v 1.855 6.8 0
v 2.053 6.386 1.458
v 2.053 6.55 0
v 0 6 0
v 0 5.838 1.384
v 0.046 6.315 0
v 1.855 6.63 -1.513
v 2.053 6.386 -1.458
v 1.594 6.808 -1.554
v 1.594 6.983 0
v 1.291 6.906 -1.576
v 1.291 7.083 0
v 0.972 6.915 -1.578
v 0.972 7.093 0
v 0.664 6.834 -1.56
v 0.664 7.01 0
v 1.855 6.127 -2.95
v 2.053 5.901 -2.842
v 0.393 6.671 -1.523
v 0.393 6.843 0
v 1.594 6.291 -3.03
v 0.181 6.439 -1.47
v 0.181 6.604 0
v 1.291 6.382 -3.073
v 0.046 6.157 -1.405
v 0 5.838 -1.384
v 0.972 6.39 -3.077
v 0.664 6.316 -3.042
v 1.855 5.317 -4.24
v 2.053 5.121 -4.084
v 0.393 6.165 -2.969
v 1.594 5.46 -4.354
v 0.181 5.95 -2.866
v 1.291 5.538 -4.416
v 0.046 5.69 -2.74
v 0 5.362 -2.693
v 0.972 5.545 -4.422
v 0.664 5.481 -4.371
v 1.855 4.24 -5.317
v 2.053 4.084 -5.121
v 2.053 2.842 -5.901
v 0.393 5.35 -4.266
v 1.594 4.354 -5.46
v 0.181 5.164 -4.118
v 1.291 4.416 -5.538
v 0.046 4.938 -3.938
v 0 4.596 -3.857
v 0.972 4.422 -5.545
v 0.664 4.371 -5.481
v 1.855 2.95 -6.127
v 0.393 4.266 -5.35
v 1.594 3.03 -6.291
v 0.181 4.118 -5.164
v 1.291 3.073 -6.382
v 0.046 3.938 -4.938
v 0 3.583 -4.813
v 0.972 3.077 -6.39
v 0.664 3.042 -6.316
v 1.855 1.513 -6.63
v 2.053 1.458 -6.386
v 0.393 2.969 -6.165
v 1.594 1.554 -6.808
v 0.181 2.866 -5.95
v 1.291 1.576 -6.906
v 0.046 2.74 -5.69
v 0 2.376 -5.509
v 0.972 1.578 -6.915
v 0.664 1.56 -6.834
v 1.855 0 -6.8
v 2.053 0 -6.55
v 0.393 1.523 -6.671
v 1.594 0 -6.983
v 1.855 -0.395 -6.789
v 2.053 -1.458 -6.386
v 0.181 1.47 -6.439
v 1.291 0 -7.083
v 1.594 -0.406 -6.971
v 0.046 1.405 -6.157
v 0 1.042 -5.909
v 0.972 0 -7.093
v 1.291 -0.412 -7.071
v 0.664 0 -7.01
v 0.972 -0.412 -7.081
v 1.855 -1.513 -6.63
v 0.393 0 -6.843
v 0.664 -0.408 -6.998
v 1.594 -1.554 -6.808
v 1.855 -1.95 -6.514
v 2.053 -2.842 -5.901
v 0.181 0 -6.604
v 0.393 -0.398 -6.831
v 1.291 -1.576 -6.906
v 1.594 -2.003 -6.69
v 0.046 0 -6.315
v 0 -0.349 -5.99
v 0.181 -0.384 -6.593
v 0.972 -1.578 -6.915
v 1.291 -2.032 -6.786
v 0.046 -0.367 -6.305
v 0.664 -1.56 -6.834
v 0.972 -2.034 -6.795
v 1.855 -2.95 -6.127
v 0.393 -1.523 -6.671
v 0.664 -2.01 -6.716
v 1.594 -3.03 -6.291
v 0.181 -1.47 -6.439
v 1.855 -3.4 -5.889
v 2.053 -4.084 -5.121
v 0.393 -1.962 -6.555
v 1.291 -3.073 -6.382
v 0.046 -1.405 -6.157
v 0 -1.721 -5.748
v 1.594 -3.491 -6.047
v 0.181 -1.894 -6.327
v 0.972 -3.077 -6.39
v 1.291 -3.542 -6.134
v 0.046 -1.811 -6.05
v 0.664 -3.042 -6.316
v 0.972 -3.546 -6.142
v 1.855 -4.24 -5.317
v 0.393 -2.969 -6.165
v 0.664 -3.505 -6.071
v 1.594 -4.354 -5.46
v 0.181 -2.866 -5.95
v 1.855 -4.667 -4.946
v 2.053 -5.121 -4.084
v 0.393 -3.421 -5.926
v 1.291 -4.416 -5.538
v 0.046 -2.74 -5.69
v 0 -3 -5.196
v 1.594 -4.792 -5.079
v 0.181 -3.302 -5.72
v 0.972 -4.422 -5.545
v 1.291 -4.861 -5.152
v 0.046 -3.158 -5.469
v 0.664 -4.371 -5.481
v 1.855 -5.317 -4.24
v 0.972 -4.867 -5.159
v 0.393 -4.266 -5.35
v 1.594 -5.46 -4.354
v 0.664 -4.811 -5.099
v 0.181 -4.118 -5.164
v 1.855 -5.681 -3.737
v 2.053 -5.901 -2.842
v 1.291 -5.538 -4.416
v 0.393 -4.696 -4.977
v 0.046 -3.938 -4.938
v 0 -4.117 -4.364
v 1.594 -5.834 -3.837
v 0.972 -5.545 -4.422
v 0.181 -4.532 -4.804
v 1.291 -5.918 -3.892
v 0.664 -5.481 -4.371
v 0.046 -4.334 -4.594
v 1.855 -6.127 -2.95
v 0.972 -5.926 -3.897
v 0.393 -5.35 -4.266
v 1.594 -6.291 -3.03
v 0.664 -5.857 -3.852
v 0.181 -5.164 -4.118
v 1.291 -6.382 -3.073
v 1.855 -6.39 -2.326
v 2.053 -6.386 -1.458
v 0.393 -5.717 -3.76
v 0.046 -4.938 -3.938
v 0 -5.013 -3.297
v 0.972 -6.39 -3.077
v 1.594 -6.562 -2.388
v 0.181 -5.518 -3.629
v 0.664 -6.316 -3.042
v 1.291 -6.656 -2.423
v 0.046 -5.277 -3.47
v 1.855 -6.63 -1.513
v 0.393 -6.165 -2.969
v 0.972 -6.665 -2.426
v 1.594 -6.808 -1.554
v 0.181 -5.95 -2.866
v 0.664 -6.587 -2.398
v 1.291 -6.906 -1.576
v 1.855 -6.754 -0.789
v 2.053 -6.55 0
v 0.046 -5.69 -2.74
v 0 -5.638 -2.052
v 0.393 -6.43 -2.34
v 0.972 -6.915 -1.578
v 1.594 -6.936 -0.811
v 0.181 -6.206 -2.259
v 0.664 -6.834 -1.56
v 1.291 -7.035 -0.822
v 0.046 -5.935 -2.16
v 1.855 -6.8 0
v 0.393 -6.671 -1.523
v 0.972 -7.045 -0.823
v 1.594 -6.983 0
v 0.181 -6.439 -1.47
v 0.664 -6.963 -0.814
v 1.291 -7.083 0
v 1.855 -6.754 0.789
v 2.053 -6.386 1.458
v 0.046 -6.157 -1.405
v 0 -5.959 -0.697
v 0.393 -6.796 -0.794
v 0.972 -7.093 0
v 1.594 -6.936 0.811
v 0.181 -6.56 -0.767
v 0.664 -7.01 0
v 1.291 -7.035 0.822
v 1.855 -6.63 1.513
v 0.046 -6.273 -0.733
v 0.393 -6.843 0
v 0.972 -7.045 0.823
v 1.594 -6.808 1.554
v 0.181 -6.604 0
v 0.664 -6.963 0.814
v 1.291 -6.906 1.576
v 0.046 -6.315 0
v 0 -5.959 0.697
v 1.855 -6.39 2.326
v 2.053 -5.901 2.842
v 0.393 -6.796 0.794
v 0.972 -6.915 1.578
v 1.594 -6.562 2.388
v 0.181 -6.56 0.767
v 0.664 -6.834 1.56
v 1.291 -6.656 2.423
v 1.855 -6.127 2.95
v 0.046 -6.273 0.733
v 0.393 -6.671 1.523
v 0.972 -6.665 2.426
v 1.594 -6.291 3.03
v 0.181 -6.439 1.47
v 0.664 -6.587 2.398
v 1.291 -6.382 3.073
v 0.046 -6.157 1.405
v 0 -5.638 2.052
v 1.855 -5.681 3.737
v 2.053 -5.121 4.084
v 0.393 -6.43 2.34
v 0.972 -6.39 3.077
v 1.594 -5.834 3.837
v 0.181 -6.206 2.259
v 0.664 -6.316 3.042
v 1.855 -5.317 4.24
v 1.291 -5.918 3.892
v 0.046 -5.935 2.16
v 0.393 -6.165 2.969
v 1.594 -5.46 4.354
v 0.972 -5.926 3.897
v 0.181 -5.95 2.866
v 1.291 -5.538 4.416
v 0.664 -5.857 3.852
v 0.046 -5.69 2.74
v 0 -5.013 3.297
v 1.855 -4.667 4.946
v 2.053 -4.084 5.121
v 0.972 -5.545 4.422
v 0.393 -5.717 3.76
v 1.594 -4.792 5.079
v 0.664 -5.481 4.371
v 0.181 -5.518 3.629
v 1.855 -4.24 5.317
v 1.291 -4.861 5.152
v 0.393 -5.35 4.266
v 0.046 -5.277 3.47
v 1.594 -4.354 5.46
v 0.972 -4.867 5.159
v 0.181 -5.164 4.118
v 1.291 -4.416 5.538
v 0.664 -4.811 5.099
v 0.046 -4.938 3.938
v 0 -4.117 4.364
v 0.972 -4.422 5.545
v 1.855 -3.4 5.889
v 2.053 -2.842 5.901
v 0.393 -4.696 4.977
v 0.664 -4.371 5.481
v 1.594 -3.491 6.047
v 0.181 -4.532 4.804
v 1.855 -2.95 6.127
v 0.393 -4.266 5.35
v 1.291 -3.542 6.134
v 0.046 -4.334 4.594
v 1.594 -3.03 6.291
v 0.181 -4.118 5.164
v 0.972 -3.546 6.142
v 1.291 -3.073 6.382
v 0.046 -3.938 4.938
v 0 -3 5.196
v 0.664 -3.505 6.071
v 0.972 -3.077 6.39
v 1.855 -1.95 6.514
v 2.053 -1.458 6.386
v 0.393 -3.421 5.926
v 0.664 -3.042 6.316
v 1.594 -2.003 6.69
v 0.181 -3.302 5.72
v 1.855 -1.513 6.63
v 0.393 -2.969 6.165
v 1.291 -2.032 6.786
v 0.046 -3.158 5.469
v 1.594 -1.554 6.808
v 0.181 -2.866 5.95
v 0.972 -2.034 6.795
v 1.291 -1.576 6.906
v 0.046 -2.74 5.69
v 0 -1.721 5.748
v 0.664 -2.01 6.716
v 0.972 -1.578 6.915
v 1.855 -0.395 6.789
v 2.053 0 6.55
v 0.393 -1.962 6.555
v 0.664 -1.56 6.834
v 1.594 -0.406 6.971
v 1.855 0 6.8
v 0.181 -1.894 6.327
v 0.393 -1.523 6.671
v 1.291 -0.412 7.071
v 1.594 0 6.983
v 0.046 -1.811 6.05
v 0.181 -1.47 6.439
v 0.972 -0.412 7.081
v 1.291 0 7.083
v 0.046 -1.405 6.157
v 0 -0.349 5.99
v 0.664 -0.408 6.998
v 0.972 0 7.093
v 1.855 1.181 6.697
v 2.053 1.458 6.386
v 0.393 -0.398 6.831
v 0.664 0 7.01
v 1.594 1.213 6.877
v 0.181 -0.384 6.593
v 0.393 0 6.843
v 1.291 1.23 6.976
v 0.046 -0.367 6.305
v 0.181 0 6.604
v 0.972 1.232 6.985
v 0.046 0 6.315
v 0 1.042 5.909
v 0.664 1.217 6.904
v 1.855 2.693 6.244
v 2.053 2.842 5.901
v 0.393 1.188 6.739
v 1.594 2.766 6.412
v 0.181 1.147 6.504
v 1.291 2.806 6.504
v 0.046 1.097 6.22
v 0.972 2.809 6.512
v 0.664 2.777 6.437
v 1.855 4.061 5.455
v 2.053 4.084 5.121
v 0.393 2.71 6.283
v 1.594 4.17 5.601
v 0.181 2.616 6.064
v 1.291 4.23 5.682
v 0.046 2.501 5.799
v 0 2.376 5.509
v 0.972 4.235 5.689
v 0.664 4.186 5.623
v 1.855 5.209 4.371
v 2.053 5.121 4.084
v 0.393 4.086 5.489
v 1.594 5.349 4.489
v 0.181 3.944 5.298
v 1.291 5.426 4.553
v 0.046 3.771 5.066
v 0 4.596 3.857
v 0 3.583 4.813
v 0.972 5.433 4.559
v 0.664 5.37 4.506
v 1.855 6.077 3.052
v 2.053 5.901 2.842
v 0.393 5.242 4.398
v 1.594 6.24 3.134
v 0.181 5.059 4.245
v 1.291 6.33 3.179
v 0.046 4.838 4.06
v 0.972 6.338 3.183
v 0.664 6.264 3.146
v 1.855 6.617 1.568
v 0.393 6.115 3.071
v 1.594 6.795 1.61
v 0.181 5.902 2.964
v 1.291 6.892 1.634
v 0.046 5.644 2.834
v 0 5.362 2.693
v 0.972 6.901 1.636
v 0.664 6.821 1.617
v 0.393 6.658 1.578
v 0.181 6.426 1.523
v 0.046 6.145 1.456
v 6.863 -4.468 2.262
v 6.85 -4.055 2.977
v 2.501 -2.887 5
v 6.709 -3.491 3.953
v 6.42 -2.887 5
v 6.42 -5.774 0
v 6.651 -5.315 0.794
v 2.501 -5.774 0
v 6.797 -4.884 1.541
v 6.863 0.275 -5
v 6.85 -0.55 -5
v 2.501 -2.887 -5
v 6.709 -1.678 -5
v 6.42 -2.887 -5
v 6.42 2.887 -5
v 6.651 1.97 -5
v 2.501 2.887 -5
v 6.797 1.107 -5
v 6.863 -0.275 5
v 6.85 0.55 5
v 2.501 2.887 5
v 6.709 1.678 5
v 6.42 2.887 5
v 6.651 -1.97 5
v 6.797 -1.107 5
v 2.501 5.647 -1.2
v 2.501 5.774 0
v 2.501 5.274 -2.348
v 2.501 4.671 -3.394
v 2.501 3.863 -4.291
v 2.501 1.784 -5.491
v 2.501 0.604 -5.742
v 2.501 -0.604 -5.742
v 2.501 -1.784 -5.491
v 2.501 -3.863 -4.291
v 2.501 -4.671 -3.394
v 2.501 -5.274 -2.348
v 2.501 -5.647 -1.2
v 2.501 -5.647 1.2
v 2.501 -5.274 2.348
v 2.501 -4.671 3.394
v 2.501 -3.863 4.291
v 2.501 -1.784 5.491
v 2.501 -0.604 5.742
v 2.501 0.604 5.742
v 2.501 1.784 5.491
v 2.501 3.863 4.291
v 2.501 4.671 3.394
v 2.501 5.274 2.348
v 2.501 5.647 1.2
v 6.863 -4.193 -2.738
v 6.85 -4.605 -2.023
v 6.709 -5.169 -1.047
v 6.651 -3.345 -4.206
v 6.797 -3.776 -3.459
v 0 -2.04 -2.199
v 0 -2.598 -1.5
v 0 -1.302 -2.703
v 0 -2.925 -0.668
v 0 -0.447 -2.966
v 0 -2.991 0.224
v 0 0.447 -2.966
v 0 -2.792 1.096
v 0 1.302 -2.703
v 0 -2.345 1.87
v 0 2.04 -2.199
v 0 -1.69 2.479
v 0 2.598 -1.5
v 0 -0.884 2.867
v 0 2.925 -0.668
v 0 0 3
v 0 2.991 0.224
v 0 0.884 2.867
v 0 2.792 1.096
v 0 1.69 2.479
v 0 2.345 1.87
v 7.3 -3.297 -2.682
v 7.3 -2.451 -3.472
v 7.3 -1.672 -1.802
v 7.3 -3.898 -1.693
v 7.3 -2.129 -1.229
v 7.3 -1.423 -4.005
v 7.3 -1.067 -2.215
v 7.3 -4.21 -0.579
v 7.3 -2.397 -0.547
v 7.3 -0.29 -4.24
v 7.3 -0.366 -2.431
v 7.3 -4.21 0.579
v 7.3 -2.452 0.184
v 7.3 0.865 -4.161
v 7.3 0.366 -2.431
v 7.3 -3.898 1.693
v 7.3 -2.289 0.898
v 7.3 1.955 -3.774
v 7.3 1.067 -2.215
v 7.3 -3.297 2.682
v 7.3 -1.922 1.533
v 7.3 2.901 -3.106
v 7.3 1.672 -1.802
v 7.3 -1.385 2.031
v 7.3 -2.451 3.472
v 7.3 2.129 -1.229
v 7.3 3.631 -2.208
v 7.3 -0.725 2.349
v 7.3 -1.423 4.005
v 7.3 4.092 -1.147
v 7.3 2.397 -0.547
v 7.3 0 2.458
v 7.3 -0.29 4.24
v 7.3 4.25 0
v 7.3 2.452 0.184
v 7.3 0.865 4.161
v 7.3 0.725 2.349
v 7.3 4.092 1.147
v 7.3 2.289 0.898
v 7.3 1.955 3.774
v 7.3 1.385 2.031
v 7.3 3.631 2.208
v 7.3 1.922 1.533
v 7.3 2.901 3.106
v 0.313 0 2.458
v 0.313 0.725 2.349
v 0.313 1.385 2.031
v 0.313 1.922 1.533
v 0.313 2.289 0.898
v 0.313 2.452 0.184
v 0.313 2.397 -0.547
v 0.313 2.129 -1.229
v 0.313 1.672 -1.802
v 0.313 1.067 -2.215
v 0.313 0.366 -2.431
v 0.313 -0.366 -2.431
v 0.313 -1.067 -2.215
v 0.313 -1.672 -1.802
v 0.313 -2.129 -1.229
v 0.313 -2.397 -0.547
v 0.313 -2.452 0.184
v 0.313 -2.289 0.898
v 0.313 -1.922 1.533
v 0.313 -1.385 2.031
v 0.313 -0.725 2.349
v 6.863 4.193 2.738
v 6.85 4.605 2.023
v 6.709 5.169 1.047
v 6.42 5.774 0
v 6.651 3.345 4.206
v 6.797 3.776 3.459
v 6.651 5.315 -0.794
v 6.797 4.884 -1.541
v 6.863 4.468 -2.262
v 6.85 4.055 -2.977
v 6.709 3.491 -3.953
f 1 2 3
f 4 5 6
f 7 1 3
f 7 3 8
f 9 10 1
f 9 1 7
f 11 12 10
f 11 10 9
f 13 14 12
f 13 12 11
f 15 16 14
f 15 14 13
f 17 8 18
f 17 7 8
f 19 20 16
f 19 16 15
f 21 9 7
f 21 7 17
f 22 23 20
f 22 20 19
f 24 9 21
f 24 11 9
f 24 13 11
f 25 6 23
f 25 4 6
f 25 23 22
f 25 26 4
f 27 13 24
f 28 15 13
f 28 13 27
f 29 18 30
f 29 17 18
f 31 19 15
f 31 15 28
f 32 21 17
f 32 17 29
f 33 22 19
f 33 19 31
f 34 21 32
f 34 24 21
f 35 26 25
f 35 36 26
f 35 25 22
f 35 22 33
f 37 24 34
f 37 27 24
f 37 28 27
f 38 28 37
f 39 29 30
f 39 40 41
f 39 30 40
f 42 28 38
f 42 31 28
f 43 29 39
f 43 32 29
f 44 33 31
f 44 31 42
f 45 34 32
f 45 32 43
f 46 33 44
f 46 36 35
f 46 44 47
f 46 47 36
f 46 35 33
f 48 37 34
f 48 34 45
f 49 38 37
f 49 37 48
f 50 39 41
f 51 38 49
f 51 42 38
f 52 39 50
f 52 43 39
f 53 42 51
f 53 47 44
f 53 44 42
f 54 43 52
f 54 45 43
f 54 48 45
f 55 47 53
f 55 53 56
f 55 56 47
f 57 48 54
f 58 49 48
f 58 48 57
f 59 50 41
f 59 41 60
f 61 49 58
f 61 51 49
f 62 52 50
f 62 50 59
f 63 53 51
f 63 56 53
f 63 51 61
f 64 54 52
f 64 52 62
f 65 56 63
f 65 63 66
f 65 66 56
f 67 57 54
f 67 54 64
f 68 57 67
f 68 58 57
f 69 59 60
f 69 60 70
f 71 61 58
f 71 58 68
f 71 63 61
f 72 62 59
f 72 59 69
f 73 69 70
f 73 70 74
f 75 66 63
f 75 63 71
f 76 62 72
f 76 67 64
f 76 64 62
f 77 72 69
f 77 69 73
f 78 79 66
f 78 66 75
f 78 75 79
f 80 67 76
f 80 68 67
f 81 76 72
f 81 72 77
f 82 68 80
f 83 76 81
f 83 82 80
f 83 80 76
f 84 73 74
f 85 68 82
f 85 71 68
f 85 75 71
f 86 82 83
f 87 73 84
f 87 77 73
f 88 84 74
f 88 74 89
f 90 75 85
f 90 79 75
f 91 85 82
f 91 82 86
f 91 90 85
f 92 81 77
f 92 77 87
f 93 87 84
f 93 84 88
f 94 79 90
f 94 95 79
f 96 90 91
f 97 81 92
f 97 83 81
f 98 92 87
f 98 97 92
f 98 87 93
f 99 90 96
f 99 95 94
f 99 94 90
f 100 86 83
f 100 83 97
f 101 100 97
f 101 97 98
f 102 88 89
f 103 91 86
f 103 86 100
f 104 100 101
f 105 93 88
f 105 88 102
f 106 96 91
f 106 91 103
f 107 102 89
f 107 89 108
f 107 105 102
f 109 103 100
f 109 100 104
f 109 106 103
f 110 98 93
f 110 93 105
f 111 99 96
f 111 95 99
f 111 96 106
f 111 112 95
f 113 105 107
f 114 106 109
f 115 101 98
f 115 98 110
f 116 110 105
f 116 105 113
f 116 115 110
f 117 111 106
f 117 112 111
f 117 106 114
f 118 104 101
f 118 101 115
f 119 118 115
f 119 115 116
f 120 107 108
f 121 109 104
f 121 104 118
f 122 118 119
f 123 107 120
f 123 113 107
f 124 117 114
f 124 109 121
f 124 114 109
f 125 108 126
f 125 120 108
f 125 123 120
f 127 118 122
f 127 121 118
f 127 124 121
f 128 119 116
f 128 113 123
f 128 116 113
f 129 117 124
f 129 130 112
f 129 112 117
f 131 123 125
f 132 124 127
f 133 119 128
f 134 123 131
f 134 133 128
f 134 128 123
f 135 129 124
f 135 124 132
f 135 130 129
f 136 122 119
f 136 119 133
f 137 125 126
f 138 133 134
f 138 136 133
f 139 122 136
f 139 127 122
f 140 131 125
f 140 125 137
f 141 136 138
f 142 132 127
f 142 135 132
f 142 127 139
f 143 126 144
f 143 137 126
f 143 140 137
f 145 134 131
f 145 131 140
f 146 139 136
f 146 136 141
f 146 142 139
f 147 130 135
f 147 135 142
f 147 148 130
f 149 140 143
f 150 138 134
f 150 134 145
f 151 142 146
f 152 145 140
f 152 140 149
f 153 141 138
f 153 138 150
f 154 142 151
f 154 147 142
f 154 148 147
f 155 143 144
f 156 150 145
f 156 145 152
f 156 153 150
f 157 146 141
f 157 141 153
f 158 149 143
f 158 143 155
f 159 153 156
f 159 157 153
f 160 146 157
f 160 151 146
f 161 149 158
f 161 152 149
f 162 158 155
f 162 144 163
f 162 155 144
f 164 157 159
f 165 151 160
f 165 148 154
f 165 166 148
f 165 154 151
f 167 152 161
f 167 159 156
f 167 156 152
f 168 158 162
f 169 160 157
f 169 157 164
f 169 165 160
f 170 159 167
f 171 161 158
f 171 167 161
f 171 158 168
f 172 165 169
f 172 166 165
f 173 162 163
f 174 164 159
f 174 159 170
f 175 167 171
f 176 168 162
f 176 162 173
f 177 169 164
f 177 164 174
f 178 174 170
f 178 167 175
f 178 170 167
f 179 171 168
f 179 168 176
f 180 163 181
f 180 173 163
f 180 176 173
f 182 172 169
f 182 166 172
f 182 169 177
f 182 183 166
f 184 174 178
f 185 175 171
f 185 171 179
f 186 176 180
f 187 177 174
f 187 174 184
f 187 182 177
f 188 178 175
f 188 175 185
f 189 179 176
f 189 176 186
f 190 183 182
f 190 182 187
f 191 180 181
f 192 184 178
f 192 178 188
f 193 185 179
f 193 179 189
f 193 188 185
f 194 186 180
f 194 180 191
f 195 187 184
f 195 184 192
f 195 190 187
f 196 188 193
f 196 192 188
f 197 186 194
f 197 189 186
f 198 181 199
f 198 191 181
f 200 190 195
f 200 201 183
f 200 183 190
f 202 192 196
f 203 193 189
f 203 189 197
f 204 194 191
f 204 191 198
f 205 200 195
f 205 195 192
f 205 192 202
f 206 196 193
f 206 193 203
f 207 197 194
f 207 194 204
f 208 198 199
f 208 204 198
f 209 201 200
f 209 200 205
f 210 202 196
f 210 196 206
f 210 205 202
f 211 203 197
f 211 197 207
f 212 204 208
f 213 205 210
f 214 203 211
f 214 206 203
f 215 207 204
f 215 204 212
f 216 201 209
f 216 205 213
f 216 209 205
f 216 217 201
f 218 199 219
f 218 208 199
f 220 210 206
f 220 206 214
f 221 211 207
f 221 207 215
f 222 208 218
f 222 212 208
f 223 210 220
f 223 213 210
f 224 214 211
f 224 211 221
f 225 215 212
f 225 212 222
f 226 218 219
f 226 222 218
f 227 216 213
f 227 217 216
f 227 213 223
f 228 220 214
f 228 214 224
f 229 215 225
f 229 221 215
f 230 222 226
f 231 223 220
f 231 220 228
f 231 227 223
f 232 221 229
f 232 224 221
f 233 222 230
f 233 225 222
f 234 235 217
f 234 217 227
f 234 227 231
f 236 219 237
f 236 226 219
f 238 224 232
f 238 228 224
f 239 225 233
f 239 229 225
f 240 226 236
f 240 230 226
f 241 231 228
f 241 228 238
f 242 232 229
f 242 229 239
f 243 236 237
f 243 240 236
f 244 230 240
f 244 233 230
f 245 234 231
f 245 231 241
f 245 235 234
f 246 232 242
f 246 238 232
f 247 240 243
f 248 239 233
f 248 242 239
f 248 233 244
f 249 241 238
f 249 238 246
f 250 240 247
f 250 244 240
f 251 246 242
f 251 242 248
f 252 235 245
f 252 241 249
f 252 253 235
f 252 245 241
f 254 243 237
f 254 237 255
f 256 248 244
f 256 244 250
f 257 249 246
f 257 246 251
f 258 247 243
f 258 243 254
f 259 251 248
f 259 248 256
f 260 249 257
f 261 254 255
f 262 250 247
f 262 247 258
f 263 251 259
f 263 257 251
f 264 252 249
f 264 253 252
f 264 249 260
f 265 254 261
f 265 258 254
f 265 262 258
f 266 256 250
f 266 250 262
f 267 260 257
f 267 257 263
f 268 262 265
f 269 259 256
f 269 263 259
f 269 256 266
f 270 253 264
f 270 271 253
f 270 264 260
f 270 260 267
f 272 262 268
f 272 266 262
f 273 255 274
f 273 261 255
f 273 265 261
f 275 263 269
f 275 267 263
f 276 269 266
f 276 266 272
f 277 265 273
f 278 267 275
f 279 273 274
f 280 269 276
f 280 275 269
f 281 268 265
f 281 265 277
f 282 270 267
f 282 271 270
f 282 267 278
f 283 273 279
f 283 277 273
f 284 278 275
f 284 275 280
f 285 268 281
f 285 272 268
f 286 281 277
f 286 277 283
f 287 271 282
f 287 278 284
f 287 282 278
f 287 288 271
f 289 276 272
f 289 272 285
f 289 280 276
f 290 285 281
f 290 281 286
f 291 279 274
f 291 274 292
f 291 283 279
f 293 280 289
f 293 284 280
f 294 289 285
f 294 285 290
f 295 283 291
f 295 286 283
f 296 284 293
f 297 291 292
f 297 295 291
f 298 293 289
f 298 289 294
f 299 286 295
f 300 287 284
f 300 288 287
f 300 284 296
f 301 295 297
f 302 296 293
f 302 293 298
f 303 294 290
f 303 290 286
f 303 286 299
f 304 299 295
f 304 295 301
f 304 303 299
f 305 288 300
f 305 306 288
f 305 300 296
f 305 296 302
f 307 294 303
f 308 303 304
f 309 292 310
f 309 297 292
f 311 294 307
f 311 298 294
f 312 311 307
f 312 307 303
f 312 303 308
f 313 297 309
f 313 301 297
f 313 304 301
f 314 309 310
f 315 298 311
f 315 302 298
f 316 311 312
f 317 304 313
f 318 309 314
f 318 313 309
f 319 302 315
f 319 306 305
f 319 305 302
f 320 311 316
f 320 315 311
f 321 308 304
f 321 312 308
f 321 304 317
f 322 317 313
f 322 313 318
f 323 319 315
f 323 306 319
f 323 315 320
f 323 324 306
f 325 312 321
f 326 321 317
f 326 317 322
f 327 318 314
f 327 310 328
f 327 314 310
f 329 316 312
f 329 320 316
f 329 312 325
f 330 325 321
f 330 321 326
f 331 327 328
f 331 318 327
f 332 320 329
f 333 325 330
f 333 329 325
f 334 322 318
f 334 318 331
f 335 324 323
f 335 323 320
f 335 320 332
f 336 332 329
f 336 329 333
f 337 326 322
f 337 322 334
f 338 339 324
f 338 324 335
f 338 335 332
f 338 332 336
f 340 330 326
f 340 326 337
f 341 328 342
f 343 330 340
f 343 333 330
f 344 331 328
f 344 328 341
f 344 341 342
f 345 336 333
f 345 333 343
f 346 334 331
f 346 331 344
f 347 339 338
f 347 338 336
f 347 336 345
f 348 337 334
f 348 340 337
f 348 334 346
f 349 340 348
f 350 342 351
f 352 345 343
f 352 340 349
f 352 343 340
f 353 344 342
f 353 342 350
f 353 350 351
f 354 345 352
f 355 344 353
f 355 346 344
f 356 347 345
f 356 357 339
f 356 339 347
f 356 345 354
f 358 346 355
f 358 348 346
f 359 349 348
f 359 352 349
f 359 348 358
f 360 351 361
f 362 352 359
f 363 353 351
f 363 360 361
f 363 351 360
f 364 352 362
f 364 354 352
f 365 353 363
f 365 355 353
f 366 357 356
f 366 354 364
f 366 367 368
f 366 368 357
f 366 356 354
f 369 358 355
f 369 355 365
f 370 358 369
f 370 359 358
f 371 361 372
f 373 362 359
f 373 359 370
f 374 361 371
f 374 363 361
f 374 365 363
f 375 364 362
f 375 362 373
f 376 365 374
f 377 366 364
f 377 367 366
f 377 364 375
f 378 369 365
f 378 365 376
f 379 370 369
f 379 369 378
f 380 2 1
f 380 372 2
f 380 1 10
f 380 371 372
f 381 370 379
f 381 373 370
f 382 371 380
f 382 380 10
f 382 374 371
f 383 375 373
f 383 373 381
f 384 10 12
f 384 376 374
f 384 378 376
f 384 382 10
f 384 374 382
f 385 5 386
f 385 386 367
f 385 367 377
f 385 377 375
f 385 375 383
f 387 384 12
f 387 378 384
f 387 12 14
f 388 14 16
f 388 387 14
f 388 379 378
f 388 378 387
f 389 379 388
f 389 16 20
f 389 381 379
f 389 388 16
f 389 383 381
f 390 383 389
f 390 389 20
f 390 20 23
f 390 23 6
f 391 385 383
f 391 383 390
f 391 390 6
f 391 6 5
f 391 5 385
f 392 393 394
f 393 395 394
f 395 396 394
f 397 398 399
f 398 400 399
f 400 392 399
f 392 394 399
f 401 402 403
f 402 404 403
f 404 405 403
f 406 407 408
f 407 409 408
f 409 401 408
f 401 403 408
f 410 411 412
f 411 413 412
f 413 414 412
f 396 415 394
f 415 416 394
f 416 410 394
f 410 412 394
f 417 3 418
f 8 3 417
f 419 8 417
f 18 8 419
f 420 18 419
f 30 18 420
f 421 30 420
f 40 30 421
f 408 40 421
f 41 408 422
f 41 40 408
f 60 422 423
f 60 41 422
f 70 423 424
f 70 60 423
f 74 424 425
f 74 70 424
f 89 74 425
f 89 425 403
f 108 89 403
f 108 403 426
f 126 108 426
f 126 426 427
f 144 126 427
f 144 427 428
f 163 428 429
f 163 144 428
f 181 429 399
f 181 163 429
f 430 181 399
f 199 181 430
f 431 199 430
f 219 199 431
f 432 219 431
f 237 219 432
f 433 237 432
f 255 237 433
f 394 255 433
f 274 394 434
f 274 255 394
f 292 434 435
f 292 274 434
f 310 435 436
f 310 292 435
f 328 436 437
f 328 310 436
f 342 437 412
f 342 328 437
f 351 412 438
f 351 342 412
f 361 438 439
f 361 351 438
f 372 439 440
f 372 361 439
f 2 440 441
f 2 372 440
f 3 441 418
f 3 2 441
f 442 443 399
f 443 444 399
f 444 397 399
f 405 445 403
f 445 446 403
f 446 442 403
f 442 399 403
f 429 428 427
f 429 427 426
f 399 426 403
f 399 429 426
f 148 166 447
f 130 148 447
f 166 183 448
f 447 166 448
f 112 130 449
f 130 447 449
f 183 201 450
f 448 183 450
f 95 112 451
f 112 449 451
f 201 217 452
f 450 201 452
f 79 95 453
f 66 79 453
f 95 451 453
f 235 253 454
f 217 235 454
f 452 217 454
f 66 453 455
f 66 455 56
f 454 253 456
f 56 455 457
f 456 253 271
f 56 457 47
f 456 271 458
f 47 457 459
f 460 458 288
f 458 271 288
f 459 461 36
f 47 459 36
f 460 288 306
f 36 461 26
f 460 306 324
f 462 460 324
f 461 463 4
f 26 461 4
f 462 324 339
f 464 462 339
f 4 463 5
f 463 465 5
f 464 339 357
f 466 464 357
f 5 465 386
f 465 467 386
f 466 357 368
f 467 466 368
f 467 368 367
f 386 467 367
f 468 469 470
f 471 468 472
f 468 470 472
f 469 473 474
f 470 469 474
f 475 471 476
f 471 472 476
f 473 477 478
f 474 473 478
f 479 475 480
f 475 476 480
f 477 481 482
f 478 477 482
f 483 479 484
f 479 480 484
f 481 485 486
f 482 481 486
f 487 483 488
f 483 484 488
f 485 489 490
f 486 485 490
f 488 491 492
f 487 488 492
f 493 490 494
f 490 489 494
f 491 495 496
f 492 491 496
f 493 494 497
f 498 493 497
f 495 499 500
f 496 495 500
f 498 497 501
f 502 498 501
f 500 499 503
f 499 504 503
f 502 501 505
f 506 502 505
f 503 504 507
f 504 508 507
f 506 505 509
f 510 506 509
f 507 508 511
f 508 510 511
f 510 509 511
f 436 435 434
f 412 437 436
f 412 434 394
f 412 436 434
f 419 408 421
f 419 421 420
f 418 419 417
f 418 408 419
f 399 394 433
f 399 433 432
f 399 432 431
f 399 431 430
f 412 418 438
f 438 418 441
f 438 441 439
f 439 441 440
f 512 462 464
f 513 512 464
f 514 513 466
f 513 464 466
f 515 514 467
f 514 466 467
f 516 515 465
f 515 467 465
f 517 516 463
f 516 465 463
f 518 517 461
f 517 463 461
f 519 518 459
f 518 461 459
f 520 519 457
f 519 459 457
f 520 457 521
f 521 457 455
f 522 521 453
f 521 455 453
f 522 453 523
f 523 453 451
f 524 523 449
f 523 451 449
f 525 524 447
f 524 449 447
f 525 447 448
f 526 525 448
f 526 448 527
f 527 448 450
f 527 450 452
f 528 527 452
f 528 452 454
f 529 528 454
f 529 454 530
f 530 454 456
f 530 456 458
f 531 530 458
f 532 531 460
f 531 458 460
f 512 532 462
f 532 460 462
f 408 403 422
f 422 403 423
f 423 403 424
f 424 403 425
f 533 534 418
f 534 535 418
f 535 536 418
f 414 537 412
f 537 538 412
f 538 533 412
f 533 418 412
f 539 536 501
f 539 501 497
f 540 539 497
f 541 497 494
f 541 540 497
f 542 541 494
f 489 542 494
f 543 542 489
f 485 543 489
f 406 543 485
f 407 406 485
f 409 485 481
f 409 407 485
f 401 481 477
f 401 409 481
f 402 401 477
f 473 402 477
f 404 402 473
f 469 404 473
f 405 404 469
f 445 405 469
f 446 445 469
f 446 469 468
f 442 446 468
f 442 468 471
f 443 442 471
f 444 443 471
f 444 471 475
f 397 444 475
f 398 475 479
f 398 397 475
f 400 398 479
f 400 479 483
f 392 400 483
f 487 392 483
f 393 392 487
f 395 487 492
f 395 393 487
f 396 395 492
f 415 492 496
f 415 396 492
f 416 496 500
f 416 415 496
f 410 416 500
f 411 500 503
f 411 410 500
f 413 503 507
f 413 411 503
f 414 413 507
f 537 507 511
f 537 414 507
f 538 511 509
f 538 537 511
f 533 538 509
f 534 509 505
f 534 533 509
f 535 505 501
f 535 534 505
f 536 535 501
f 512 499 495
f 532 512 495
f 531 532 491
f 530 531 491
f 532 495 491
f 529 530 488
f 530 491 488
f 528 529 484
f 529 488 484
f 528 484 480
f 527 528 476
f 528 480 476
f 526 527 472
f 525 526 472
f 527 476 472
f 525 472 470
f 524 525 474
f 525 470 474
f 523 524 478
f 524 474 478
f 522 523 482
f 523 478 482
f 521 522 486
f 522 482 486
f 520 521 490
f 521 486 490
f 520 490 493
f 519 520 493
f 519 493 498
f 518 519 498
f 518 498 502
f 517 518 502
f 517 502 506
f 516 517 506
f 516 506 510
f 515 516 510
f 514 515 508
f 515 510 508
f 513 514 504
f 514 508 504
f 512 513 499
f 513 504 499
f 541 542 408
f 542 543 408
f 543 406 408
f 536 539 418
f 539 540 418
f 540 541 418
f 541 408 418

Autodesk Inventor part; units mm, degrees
ref_plane "YZ Plane" through (0, 0, 0) normal (1, 0, 0) x (0, 1, 0)
ref_plane "XZ Plane" through (0, 0, 0) normal (0, 1, 0) x (-1, 0, 0)
sketch "Esquisse1" plane through (0, 0, 0) normal (0, 0, 1) x (1, 0, 0)
  line L0 (-1.7132, 0) -> (8.8022, 0) projected
  line L1 (2.5009, 5.7735) -> (2.0526, 6.55)
  line L2 (2.5009, 5.7735) -> (7.3, 5.7735) construction
  line L3 (7.3, 5.7735) -> (7.3, 0) construction
  arc A0 (2.0526, 6.55) -> (0, 6) centre (1.1, 6) ccw
  line L4 (2.5009, 5.7735) -> (2.5009, 0)
  line L5 (0, -1.4675) -> (0, 8.805) projected
  point P0 (0, 0)
  dimension "d2" = 11.547
  dimension "d4" = 14.2
  dimension "d5" = 1.1
  dimension "d15" = 7.3
  dimension "d16" = 30
revolve "Anneau" add sketch "Esquisse1" angle 360 about axis through (-10, 0, 0) along (1, 0, 0)
sketch "Esquisse2" plane through (0, 0, 0) normal (-1, 0, 0) x (0, 0, 1)
  circle A0 centre (0, 0) radius 4.9
  line L0 (-5, -2.8868) -> (-5, 2.8868)
  line L1 (-5, 2.8868) -> (0, 5.7735)
  line L2 (0, 5.7735) -> (5, 2.8868)
  line L3 (5, 2.8868) -> (5, -2.8868)
  line L4 (5, -2.8868) -> (0, -5.7735)
  line L5 (0, -5.7735) -> (-5, -2.8868)
  circle A1 centre (0, 0) radius 6 projected
  dimension "d6" = 11.547
extrude "Corps" add sketch "Esquisse2" against normal blind 7.3 contours A0 | L0 L1 L2 L3 L4 L5
sketch "Esquisse3" plane through (0, 0, 0) normal (0, 0, 1) x (1, 0, 0)
  line L0 (2.5009, 5.7735) -> (7.3, 5.7735) projected
  line L1 (7.3, 2.8868) -> (7.3, 5.7735) projected
  line L2 (0, -6) -> (0, 6) projected
  line L3 (-1.46, 0) -> (8.76, 0) projected
  line L4 (6.4204, 5.7735) -> (7.3, 4.25)
  dimension "d10" = 30
  dimension "d11" = 8.5
revolve "Chanfrein1" cut sketch "Esquisse3" angle 360 about axis through (-10, 0, 0) along (1, 0, 0)
sketch "Esquisse4" plane through (0, 0, 0) normal (-1, 0, 0) x (0, 0, 1)
  line L0 (-9.94, 0) -> (9.94, 0) projected
  line L1 (0, 9.94) -> (0, -9.94) projected
  point P0 (0, 0)
hole "Filetage" at (0, 0, 0) direction (1, 0, 0) diameter 4.917 end through all thread size "M6x1" class "6H" standard "ANSI Metric M Profile"
chamfer "Chanfrein2" distance 0.5413 angle 30 1 edges at (0, 0, -2.4585) measured on face at (0, 4.7554, -0.5774)
ref_plane "Work Plane1" through (21.3675, 0, 0) normal (0, 0, -1) x (-1, 0, 0)
equation "\"d2\" = 1.1547 * SW"
equation "\"d4\" = LADI"
equation "\"d5\" = PHH"
equation "\"d15\" = KOH"
equation "\"d16\" = KEWI"
equation "\"d6\" = 1.1547 * SW"
equation "\"d7\" = KOH"
equation "\"d10\" = ANG1"
equation "\"d11\" = SW0"
equation "\"d12\" = -0.5 * GD1 + 0.5 * NND"
equation "\"d42\" = -0.5 * GD1 + 0.5 * NND"
equation "\"ANG1\" = 30deg"
equation "\"KEWI\" = 30deg"
equation "\"NND\" = 6"
equation "\"LADI\" = 14.2"
equation "\"PHH\" = 1.1"
equation "\"KOH\" = 7.3"
equation "\"SW0\" = 0.85 * SW"
equation "\"d1\" = LADI"
equation "\"d3\" = PHH"
equation "\"GUL\" = 0.541266 * PTC"
equation "\"THREADDIA\" = 6"
equation "\"TOA\" = 30deg"
equation "\"PTC\" = 1"
equation "\"GAL\" = 0.541266 * PTC"
equation "\"E0\" = 1.155 * SW"
equation "\"SW\" = 10"
equation "\"GD1\" = 4.917468"
properties part number "ANSI B18.16.3M - M6 x 1 Type de métal" material "Acier, doux"
